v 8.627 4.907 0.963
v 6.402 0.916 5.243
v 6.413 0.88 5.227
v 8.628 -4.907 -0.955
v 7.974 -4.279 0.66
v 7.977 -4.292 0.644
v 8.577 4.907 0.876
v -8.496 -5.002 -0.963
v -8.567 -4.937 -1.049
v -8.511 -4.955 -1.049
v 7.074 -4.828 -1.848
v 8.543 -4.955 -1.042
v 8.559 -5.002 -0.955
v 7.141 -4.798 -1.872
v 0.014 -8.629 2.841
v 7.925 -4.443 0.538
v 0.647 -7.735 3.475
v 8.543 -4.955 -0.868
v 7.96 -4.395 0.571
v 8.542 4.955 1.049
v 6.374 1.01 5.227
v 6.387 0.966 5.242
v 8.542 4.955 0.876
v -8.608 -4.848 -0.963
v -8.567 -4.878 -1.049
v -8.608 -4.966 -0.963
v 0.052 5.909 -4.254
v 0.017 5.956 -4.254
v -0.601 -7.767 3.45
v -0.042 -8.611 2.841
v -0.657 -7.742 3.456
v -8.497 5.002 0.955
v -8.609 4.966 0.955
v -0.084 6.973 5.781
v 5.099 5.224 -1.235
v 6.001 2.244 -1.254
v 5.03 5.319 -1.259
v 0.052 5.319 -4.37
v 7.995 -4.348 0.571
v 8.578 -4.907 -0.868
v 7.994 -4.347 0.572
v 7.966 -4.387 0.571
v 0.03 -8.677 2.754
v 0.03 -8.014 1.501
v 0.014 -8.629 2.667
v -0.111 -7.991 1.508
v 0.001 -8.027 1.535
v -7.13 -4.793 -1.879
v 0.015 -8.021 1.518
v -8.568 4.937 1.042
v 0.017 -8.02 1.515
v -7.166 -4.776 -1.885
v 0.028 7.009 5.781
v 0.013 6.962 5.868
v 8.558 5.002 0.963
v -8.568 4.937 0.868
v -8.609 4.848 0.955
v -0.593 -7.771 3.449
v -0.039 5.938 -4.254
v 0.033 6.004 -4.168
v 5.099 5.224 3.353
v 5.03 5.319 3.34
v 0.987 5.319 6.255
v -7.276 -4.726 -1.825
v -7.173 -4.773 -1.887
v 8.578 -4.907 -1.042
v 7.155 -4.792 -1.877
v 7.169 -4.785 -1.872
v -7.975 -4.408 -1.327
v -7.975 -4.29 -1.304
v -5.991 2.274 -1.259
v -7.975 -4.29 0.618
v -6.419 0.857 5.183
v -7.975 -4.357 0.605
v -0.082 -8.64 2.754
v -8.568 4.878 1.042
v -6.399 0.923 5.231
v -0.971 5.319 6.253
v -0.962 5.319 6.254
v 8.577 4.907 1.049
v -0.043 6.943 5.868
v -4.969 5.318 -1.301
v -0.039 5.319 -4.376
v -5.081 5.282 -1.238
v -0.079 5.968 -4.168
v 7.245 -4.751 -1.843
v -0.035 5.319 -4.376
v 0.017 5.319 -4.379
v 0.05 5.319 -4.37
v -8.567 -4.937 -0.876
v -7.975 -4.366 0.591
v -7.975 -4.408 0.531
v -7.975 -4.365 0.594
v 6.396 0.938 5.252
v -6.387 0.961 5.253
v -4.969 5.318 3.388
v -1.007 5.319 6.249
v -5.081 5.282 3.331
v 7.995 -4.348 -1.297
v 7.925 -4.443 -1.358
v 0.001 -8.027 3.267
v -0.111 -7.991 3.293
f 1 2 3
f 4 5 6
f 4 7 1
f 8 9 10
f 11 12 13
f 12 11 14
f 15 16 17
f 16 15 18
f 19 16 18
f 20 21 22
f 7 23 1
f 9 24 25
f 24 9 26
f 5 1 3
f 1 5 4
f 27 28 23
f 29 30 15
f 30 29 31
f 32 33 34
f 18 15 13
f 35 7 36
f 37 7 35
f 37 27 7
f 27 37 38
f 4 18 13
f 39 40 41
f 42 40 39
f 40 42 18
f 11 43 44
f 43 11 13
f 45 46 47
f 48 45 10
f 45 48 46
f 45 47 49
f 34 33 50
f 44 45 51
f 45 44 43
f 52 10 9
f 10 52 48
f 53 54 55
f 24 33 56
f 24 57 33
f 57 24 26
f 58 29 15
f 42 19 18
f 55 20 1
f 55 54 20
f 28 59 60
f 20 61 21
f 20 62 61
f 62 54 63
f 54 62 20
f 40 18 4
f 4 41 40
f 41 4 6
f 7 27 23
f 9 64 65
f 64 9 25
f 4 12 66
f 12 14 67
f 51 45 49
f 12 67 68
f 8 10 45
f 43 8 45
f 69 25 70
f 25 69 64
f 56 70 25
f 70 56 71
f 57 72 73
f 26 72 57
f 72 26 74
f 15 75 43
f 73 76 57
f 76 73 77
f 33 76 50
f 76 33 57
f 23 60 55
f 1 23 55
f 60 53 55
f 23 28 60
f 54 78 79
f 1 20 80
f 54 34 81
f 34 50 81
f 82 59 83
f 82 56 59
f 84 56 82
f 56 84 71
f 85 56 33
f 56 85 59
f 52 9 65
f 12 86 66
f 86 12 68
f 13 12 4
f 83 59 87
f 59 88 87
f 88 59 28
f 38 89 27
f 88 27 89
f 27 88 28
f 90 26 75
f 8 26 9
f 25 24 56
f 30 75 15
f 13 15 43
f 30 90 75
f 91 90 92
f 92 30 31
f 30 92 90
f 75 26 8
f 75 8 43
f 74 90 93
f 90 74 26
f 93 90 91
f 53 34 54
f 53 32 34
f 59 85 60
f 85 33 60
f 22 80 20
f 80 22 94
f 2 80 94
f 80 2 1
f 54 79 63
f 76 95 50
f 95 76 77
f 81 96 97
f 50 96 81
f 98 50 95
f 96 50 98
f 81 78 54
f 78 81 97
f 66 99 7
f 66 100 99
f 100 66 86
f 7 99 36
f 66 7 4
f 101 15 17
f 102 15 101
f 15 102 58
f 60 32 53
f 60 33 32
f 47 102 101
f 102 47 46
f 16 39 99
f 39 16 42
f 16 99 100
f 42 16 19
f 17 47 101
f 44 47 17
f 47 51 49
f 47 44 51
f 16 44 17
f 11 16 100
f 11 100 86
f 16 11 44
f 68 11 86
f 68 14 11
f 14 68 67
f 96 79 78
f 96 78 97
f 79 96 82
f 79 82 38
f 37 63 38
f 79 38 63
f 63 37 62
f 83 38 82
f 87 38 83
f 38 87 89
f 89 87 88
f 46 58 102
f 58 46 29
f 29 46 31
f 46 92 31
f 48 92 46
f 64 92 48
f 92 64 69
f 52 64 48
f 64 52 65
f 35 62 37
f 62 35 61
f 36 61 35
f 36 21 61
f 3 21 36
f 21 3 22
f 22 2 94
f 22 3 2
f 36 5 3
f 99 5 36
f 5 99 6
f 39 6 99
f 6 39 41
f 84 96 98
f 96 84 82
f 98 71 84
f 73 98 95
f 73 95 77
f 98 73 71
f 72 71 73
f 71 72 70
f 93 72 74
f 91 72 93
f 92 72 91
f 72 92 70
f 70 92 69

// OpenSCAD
// Auto-generated OpenSCAD file

    inner_points = 10*[[-0.49475772011132046, 0.003839472954238088, 0.8557705860181677], [0.505223446776251, 0.0038995730095640058, 0.8496336276384451], [-0.505223446776251, -0.0038995730095640058, -0.8496336276384451], [0.49475772011132046, -0.003839472954238088, -0.8557705860181677], [0.003137871696801686, -0.788661439733275, 0.5035742160091927], [-0.002998750789873661, -0.7931992616167778, -0.49639665858516746], [-0.5000365230269928, 0.5223214995430275, 0.0006983537803530961], [0.4999446438605786, 0.5223815995983536, -0.00543860459936947], [-0.789374516264686, -0.4348859382371884, 0.006817726903340358], [0.7894510022985628, -0.43479104894911214, -0.0028716420739015092]];

    outer_points = 10*[[0.8526836986618631, 0.4907220093236373, 0.09625829137218865], [0.8527700142393673, -0.4907220093236373, -0.09549058296899036], [-0.8527700142393673, 0.4907220093236373, 0.09549058296899036], [-0.8526836986618631, -0.4907220093236373, -0.09625829137218865], [0.49965051582430237, -0.15166158156646264, 0.7764868514685156], [-0.5003493828586203, -0.15166158156646264, 0.7760367024438842], [0.00018761744828893297, 0.5908833725510971, -0.4167895941433019], [0.00027393302579300583, -0.3905606460961775, -0.6085384684844809], [-0.0002602518163823537, 0.6913983635916522, 0.578145848983155], [-0.0001239720133965481, -0.8581596810908002, 0.27540213141105363]];

    // Convex hull for inner set (I)
    module inner_hull() {
        hull() {
            for (p = inner_points) {
                translate(p) sphere(r=0.1);
            }
        }
    }

    // Convex hull for outer set (O) minus inner hull (O \ I)
    module outer_minus_inner() {
        difference() {
            hull() {
                for (p = outer_points) {
                    translate(p) sphere(r=0.1);
                }
            }
            inner_hull(); // Subtract inner hull
        }
    }

    // Convex hull for outer set (O) minus all translated inner hulls
    module outer_minus_AllTranslationInner() {
        difference() {
            hull() {
                for (p = outer_points) {
                    translate(p) sphere(r=0.1);
                }
            }
            hull() {
                translate([0,0,50]) inner_hull();
                translate([0,0,-50]) inner_hull();
            }; // Subtract translated inner hulls
        }
    }

    // Difference between outer_minus_inner and outer_minus_AllTranslationInner
    module outer_minus_inner_diff() {
        difference() {
            // Outer minus inner
            difference() {
                hull() {
                    for (p = outer_points) {
                        translate(p) sphere(r=0.1);
                    }
                }
                inner_hull();
            }

            // Subtract Outer minus AllTranslationInner
            difference() {
                hull() {
                    for (p = outer_points) {
                        translate(p) sphere(r=0.1);
                    }
                }
                hull() {
                    translate([0,0,50]) inner_hull();
                    translate([0,0,-50]) inner_hull();
                };
            }
        }
    }

    // Rendering all with colors applied
    color([0, 1, 0, 1]) outer_minus_AllTranslationInner(); // Opaque green
    
